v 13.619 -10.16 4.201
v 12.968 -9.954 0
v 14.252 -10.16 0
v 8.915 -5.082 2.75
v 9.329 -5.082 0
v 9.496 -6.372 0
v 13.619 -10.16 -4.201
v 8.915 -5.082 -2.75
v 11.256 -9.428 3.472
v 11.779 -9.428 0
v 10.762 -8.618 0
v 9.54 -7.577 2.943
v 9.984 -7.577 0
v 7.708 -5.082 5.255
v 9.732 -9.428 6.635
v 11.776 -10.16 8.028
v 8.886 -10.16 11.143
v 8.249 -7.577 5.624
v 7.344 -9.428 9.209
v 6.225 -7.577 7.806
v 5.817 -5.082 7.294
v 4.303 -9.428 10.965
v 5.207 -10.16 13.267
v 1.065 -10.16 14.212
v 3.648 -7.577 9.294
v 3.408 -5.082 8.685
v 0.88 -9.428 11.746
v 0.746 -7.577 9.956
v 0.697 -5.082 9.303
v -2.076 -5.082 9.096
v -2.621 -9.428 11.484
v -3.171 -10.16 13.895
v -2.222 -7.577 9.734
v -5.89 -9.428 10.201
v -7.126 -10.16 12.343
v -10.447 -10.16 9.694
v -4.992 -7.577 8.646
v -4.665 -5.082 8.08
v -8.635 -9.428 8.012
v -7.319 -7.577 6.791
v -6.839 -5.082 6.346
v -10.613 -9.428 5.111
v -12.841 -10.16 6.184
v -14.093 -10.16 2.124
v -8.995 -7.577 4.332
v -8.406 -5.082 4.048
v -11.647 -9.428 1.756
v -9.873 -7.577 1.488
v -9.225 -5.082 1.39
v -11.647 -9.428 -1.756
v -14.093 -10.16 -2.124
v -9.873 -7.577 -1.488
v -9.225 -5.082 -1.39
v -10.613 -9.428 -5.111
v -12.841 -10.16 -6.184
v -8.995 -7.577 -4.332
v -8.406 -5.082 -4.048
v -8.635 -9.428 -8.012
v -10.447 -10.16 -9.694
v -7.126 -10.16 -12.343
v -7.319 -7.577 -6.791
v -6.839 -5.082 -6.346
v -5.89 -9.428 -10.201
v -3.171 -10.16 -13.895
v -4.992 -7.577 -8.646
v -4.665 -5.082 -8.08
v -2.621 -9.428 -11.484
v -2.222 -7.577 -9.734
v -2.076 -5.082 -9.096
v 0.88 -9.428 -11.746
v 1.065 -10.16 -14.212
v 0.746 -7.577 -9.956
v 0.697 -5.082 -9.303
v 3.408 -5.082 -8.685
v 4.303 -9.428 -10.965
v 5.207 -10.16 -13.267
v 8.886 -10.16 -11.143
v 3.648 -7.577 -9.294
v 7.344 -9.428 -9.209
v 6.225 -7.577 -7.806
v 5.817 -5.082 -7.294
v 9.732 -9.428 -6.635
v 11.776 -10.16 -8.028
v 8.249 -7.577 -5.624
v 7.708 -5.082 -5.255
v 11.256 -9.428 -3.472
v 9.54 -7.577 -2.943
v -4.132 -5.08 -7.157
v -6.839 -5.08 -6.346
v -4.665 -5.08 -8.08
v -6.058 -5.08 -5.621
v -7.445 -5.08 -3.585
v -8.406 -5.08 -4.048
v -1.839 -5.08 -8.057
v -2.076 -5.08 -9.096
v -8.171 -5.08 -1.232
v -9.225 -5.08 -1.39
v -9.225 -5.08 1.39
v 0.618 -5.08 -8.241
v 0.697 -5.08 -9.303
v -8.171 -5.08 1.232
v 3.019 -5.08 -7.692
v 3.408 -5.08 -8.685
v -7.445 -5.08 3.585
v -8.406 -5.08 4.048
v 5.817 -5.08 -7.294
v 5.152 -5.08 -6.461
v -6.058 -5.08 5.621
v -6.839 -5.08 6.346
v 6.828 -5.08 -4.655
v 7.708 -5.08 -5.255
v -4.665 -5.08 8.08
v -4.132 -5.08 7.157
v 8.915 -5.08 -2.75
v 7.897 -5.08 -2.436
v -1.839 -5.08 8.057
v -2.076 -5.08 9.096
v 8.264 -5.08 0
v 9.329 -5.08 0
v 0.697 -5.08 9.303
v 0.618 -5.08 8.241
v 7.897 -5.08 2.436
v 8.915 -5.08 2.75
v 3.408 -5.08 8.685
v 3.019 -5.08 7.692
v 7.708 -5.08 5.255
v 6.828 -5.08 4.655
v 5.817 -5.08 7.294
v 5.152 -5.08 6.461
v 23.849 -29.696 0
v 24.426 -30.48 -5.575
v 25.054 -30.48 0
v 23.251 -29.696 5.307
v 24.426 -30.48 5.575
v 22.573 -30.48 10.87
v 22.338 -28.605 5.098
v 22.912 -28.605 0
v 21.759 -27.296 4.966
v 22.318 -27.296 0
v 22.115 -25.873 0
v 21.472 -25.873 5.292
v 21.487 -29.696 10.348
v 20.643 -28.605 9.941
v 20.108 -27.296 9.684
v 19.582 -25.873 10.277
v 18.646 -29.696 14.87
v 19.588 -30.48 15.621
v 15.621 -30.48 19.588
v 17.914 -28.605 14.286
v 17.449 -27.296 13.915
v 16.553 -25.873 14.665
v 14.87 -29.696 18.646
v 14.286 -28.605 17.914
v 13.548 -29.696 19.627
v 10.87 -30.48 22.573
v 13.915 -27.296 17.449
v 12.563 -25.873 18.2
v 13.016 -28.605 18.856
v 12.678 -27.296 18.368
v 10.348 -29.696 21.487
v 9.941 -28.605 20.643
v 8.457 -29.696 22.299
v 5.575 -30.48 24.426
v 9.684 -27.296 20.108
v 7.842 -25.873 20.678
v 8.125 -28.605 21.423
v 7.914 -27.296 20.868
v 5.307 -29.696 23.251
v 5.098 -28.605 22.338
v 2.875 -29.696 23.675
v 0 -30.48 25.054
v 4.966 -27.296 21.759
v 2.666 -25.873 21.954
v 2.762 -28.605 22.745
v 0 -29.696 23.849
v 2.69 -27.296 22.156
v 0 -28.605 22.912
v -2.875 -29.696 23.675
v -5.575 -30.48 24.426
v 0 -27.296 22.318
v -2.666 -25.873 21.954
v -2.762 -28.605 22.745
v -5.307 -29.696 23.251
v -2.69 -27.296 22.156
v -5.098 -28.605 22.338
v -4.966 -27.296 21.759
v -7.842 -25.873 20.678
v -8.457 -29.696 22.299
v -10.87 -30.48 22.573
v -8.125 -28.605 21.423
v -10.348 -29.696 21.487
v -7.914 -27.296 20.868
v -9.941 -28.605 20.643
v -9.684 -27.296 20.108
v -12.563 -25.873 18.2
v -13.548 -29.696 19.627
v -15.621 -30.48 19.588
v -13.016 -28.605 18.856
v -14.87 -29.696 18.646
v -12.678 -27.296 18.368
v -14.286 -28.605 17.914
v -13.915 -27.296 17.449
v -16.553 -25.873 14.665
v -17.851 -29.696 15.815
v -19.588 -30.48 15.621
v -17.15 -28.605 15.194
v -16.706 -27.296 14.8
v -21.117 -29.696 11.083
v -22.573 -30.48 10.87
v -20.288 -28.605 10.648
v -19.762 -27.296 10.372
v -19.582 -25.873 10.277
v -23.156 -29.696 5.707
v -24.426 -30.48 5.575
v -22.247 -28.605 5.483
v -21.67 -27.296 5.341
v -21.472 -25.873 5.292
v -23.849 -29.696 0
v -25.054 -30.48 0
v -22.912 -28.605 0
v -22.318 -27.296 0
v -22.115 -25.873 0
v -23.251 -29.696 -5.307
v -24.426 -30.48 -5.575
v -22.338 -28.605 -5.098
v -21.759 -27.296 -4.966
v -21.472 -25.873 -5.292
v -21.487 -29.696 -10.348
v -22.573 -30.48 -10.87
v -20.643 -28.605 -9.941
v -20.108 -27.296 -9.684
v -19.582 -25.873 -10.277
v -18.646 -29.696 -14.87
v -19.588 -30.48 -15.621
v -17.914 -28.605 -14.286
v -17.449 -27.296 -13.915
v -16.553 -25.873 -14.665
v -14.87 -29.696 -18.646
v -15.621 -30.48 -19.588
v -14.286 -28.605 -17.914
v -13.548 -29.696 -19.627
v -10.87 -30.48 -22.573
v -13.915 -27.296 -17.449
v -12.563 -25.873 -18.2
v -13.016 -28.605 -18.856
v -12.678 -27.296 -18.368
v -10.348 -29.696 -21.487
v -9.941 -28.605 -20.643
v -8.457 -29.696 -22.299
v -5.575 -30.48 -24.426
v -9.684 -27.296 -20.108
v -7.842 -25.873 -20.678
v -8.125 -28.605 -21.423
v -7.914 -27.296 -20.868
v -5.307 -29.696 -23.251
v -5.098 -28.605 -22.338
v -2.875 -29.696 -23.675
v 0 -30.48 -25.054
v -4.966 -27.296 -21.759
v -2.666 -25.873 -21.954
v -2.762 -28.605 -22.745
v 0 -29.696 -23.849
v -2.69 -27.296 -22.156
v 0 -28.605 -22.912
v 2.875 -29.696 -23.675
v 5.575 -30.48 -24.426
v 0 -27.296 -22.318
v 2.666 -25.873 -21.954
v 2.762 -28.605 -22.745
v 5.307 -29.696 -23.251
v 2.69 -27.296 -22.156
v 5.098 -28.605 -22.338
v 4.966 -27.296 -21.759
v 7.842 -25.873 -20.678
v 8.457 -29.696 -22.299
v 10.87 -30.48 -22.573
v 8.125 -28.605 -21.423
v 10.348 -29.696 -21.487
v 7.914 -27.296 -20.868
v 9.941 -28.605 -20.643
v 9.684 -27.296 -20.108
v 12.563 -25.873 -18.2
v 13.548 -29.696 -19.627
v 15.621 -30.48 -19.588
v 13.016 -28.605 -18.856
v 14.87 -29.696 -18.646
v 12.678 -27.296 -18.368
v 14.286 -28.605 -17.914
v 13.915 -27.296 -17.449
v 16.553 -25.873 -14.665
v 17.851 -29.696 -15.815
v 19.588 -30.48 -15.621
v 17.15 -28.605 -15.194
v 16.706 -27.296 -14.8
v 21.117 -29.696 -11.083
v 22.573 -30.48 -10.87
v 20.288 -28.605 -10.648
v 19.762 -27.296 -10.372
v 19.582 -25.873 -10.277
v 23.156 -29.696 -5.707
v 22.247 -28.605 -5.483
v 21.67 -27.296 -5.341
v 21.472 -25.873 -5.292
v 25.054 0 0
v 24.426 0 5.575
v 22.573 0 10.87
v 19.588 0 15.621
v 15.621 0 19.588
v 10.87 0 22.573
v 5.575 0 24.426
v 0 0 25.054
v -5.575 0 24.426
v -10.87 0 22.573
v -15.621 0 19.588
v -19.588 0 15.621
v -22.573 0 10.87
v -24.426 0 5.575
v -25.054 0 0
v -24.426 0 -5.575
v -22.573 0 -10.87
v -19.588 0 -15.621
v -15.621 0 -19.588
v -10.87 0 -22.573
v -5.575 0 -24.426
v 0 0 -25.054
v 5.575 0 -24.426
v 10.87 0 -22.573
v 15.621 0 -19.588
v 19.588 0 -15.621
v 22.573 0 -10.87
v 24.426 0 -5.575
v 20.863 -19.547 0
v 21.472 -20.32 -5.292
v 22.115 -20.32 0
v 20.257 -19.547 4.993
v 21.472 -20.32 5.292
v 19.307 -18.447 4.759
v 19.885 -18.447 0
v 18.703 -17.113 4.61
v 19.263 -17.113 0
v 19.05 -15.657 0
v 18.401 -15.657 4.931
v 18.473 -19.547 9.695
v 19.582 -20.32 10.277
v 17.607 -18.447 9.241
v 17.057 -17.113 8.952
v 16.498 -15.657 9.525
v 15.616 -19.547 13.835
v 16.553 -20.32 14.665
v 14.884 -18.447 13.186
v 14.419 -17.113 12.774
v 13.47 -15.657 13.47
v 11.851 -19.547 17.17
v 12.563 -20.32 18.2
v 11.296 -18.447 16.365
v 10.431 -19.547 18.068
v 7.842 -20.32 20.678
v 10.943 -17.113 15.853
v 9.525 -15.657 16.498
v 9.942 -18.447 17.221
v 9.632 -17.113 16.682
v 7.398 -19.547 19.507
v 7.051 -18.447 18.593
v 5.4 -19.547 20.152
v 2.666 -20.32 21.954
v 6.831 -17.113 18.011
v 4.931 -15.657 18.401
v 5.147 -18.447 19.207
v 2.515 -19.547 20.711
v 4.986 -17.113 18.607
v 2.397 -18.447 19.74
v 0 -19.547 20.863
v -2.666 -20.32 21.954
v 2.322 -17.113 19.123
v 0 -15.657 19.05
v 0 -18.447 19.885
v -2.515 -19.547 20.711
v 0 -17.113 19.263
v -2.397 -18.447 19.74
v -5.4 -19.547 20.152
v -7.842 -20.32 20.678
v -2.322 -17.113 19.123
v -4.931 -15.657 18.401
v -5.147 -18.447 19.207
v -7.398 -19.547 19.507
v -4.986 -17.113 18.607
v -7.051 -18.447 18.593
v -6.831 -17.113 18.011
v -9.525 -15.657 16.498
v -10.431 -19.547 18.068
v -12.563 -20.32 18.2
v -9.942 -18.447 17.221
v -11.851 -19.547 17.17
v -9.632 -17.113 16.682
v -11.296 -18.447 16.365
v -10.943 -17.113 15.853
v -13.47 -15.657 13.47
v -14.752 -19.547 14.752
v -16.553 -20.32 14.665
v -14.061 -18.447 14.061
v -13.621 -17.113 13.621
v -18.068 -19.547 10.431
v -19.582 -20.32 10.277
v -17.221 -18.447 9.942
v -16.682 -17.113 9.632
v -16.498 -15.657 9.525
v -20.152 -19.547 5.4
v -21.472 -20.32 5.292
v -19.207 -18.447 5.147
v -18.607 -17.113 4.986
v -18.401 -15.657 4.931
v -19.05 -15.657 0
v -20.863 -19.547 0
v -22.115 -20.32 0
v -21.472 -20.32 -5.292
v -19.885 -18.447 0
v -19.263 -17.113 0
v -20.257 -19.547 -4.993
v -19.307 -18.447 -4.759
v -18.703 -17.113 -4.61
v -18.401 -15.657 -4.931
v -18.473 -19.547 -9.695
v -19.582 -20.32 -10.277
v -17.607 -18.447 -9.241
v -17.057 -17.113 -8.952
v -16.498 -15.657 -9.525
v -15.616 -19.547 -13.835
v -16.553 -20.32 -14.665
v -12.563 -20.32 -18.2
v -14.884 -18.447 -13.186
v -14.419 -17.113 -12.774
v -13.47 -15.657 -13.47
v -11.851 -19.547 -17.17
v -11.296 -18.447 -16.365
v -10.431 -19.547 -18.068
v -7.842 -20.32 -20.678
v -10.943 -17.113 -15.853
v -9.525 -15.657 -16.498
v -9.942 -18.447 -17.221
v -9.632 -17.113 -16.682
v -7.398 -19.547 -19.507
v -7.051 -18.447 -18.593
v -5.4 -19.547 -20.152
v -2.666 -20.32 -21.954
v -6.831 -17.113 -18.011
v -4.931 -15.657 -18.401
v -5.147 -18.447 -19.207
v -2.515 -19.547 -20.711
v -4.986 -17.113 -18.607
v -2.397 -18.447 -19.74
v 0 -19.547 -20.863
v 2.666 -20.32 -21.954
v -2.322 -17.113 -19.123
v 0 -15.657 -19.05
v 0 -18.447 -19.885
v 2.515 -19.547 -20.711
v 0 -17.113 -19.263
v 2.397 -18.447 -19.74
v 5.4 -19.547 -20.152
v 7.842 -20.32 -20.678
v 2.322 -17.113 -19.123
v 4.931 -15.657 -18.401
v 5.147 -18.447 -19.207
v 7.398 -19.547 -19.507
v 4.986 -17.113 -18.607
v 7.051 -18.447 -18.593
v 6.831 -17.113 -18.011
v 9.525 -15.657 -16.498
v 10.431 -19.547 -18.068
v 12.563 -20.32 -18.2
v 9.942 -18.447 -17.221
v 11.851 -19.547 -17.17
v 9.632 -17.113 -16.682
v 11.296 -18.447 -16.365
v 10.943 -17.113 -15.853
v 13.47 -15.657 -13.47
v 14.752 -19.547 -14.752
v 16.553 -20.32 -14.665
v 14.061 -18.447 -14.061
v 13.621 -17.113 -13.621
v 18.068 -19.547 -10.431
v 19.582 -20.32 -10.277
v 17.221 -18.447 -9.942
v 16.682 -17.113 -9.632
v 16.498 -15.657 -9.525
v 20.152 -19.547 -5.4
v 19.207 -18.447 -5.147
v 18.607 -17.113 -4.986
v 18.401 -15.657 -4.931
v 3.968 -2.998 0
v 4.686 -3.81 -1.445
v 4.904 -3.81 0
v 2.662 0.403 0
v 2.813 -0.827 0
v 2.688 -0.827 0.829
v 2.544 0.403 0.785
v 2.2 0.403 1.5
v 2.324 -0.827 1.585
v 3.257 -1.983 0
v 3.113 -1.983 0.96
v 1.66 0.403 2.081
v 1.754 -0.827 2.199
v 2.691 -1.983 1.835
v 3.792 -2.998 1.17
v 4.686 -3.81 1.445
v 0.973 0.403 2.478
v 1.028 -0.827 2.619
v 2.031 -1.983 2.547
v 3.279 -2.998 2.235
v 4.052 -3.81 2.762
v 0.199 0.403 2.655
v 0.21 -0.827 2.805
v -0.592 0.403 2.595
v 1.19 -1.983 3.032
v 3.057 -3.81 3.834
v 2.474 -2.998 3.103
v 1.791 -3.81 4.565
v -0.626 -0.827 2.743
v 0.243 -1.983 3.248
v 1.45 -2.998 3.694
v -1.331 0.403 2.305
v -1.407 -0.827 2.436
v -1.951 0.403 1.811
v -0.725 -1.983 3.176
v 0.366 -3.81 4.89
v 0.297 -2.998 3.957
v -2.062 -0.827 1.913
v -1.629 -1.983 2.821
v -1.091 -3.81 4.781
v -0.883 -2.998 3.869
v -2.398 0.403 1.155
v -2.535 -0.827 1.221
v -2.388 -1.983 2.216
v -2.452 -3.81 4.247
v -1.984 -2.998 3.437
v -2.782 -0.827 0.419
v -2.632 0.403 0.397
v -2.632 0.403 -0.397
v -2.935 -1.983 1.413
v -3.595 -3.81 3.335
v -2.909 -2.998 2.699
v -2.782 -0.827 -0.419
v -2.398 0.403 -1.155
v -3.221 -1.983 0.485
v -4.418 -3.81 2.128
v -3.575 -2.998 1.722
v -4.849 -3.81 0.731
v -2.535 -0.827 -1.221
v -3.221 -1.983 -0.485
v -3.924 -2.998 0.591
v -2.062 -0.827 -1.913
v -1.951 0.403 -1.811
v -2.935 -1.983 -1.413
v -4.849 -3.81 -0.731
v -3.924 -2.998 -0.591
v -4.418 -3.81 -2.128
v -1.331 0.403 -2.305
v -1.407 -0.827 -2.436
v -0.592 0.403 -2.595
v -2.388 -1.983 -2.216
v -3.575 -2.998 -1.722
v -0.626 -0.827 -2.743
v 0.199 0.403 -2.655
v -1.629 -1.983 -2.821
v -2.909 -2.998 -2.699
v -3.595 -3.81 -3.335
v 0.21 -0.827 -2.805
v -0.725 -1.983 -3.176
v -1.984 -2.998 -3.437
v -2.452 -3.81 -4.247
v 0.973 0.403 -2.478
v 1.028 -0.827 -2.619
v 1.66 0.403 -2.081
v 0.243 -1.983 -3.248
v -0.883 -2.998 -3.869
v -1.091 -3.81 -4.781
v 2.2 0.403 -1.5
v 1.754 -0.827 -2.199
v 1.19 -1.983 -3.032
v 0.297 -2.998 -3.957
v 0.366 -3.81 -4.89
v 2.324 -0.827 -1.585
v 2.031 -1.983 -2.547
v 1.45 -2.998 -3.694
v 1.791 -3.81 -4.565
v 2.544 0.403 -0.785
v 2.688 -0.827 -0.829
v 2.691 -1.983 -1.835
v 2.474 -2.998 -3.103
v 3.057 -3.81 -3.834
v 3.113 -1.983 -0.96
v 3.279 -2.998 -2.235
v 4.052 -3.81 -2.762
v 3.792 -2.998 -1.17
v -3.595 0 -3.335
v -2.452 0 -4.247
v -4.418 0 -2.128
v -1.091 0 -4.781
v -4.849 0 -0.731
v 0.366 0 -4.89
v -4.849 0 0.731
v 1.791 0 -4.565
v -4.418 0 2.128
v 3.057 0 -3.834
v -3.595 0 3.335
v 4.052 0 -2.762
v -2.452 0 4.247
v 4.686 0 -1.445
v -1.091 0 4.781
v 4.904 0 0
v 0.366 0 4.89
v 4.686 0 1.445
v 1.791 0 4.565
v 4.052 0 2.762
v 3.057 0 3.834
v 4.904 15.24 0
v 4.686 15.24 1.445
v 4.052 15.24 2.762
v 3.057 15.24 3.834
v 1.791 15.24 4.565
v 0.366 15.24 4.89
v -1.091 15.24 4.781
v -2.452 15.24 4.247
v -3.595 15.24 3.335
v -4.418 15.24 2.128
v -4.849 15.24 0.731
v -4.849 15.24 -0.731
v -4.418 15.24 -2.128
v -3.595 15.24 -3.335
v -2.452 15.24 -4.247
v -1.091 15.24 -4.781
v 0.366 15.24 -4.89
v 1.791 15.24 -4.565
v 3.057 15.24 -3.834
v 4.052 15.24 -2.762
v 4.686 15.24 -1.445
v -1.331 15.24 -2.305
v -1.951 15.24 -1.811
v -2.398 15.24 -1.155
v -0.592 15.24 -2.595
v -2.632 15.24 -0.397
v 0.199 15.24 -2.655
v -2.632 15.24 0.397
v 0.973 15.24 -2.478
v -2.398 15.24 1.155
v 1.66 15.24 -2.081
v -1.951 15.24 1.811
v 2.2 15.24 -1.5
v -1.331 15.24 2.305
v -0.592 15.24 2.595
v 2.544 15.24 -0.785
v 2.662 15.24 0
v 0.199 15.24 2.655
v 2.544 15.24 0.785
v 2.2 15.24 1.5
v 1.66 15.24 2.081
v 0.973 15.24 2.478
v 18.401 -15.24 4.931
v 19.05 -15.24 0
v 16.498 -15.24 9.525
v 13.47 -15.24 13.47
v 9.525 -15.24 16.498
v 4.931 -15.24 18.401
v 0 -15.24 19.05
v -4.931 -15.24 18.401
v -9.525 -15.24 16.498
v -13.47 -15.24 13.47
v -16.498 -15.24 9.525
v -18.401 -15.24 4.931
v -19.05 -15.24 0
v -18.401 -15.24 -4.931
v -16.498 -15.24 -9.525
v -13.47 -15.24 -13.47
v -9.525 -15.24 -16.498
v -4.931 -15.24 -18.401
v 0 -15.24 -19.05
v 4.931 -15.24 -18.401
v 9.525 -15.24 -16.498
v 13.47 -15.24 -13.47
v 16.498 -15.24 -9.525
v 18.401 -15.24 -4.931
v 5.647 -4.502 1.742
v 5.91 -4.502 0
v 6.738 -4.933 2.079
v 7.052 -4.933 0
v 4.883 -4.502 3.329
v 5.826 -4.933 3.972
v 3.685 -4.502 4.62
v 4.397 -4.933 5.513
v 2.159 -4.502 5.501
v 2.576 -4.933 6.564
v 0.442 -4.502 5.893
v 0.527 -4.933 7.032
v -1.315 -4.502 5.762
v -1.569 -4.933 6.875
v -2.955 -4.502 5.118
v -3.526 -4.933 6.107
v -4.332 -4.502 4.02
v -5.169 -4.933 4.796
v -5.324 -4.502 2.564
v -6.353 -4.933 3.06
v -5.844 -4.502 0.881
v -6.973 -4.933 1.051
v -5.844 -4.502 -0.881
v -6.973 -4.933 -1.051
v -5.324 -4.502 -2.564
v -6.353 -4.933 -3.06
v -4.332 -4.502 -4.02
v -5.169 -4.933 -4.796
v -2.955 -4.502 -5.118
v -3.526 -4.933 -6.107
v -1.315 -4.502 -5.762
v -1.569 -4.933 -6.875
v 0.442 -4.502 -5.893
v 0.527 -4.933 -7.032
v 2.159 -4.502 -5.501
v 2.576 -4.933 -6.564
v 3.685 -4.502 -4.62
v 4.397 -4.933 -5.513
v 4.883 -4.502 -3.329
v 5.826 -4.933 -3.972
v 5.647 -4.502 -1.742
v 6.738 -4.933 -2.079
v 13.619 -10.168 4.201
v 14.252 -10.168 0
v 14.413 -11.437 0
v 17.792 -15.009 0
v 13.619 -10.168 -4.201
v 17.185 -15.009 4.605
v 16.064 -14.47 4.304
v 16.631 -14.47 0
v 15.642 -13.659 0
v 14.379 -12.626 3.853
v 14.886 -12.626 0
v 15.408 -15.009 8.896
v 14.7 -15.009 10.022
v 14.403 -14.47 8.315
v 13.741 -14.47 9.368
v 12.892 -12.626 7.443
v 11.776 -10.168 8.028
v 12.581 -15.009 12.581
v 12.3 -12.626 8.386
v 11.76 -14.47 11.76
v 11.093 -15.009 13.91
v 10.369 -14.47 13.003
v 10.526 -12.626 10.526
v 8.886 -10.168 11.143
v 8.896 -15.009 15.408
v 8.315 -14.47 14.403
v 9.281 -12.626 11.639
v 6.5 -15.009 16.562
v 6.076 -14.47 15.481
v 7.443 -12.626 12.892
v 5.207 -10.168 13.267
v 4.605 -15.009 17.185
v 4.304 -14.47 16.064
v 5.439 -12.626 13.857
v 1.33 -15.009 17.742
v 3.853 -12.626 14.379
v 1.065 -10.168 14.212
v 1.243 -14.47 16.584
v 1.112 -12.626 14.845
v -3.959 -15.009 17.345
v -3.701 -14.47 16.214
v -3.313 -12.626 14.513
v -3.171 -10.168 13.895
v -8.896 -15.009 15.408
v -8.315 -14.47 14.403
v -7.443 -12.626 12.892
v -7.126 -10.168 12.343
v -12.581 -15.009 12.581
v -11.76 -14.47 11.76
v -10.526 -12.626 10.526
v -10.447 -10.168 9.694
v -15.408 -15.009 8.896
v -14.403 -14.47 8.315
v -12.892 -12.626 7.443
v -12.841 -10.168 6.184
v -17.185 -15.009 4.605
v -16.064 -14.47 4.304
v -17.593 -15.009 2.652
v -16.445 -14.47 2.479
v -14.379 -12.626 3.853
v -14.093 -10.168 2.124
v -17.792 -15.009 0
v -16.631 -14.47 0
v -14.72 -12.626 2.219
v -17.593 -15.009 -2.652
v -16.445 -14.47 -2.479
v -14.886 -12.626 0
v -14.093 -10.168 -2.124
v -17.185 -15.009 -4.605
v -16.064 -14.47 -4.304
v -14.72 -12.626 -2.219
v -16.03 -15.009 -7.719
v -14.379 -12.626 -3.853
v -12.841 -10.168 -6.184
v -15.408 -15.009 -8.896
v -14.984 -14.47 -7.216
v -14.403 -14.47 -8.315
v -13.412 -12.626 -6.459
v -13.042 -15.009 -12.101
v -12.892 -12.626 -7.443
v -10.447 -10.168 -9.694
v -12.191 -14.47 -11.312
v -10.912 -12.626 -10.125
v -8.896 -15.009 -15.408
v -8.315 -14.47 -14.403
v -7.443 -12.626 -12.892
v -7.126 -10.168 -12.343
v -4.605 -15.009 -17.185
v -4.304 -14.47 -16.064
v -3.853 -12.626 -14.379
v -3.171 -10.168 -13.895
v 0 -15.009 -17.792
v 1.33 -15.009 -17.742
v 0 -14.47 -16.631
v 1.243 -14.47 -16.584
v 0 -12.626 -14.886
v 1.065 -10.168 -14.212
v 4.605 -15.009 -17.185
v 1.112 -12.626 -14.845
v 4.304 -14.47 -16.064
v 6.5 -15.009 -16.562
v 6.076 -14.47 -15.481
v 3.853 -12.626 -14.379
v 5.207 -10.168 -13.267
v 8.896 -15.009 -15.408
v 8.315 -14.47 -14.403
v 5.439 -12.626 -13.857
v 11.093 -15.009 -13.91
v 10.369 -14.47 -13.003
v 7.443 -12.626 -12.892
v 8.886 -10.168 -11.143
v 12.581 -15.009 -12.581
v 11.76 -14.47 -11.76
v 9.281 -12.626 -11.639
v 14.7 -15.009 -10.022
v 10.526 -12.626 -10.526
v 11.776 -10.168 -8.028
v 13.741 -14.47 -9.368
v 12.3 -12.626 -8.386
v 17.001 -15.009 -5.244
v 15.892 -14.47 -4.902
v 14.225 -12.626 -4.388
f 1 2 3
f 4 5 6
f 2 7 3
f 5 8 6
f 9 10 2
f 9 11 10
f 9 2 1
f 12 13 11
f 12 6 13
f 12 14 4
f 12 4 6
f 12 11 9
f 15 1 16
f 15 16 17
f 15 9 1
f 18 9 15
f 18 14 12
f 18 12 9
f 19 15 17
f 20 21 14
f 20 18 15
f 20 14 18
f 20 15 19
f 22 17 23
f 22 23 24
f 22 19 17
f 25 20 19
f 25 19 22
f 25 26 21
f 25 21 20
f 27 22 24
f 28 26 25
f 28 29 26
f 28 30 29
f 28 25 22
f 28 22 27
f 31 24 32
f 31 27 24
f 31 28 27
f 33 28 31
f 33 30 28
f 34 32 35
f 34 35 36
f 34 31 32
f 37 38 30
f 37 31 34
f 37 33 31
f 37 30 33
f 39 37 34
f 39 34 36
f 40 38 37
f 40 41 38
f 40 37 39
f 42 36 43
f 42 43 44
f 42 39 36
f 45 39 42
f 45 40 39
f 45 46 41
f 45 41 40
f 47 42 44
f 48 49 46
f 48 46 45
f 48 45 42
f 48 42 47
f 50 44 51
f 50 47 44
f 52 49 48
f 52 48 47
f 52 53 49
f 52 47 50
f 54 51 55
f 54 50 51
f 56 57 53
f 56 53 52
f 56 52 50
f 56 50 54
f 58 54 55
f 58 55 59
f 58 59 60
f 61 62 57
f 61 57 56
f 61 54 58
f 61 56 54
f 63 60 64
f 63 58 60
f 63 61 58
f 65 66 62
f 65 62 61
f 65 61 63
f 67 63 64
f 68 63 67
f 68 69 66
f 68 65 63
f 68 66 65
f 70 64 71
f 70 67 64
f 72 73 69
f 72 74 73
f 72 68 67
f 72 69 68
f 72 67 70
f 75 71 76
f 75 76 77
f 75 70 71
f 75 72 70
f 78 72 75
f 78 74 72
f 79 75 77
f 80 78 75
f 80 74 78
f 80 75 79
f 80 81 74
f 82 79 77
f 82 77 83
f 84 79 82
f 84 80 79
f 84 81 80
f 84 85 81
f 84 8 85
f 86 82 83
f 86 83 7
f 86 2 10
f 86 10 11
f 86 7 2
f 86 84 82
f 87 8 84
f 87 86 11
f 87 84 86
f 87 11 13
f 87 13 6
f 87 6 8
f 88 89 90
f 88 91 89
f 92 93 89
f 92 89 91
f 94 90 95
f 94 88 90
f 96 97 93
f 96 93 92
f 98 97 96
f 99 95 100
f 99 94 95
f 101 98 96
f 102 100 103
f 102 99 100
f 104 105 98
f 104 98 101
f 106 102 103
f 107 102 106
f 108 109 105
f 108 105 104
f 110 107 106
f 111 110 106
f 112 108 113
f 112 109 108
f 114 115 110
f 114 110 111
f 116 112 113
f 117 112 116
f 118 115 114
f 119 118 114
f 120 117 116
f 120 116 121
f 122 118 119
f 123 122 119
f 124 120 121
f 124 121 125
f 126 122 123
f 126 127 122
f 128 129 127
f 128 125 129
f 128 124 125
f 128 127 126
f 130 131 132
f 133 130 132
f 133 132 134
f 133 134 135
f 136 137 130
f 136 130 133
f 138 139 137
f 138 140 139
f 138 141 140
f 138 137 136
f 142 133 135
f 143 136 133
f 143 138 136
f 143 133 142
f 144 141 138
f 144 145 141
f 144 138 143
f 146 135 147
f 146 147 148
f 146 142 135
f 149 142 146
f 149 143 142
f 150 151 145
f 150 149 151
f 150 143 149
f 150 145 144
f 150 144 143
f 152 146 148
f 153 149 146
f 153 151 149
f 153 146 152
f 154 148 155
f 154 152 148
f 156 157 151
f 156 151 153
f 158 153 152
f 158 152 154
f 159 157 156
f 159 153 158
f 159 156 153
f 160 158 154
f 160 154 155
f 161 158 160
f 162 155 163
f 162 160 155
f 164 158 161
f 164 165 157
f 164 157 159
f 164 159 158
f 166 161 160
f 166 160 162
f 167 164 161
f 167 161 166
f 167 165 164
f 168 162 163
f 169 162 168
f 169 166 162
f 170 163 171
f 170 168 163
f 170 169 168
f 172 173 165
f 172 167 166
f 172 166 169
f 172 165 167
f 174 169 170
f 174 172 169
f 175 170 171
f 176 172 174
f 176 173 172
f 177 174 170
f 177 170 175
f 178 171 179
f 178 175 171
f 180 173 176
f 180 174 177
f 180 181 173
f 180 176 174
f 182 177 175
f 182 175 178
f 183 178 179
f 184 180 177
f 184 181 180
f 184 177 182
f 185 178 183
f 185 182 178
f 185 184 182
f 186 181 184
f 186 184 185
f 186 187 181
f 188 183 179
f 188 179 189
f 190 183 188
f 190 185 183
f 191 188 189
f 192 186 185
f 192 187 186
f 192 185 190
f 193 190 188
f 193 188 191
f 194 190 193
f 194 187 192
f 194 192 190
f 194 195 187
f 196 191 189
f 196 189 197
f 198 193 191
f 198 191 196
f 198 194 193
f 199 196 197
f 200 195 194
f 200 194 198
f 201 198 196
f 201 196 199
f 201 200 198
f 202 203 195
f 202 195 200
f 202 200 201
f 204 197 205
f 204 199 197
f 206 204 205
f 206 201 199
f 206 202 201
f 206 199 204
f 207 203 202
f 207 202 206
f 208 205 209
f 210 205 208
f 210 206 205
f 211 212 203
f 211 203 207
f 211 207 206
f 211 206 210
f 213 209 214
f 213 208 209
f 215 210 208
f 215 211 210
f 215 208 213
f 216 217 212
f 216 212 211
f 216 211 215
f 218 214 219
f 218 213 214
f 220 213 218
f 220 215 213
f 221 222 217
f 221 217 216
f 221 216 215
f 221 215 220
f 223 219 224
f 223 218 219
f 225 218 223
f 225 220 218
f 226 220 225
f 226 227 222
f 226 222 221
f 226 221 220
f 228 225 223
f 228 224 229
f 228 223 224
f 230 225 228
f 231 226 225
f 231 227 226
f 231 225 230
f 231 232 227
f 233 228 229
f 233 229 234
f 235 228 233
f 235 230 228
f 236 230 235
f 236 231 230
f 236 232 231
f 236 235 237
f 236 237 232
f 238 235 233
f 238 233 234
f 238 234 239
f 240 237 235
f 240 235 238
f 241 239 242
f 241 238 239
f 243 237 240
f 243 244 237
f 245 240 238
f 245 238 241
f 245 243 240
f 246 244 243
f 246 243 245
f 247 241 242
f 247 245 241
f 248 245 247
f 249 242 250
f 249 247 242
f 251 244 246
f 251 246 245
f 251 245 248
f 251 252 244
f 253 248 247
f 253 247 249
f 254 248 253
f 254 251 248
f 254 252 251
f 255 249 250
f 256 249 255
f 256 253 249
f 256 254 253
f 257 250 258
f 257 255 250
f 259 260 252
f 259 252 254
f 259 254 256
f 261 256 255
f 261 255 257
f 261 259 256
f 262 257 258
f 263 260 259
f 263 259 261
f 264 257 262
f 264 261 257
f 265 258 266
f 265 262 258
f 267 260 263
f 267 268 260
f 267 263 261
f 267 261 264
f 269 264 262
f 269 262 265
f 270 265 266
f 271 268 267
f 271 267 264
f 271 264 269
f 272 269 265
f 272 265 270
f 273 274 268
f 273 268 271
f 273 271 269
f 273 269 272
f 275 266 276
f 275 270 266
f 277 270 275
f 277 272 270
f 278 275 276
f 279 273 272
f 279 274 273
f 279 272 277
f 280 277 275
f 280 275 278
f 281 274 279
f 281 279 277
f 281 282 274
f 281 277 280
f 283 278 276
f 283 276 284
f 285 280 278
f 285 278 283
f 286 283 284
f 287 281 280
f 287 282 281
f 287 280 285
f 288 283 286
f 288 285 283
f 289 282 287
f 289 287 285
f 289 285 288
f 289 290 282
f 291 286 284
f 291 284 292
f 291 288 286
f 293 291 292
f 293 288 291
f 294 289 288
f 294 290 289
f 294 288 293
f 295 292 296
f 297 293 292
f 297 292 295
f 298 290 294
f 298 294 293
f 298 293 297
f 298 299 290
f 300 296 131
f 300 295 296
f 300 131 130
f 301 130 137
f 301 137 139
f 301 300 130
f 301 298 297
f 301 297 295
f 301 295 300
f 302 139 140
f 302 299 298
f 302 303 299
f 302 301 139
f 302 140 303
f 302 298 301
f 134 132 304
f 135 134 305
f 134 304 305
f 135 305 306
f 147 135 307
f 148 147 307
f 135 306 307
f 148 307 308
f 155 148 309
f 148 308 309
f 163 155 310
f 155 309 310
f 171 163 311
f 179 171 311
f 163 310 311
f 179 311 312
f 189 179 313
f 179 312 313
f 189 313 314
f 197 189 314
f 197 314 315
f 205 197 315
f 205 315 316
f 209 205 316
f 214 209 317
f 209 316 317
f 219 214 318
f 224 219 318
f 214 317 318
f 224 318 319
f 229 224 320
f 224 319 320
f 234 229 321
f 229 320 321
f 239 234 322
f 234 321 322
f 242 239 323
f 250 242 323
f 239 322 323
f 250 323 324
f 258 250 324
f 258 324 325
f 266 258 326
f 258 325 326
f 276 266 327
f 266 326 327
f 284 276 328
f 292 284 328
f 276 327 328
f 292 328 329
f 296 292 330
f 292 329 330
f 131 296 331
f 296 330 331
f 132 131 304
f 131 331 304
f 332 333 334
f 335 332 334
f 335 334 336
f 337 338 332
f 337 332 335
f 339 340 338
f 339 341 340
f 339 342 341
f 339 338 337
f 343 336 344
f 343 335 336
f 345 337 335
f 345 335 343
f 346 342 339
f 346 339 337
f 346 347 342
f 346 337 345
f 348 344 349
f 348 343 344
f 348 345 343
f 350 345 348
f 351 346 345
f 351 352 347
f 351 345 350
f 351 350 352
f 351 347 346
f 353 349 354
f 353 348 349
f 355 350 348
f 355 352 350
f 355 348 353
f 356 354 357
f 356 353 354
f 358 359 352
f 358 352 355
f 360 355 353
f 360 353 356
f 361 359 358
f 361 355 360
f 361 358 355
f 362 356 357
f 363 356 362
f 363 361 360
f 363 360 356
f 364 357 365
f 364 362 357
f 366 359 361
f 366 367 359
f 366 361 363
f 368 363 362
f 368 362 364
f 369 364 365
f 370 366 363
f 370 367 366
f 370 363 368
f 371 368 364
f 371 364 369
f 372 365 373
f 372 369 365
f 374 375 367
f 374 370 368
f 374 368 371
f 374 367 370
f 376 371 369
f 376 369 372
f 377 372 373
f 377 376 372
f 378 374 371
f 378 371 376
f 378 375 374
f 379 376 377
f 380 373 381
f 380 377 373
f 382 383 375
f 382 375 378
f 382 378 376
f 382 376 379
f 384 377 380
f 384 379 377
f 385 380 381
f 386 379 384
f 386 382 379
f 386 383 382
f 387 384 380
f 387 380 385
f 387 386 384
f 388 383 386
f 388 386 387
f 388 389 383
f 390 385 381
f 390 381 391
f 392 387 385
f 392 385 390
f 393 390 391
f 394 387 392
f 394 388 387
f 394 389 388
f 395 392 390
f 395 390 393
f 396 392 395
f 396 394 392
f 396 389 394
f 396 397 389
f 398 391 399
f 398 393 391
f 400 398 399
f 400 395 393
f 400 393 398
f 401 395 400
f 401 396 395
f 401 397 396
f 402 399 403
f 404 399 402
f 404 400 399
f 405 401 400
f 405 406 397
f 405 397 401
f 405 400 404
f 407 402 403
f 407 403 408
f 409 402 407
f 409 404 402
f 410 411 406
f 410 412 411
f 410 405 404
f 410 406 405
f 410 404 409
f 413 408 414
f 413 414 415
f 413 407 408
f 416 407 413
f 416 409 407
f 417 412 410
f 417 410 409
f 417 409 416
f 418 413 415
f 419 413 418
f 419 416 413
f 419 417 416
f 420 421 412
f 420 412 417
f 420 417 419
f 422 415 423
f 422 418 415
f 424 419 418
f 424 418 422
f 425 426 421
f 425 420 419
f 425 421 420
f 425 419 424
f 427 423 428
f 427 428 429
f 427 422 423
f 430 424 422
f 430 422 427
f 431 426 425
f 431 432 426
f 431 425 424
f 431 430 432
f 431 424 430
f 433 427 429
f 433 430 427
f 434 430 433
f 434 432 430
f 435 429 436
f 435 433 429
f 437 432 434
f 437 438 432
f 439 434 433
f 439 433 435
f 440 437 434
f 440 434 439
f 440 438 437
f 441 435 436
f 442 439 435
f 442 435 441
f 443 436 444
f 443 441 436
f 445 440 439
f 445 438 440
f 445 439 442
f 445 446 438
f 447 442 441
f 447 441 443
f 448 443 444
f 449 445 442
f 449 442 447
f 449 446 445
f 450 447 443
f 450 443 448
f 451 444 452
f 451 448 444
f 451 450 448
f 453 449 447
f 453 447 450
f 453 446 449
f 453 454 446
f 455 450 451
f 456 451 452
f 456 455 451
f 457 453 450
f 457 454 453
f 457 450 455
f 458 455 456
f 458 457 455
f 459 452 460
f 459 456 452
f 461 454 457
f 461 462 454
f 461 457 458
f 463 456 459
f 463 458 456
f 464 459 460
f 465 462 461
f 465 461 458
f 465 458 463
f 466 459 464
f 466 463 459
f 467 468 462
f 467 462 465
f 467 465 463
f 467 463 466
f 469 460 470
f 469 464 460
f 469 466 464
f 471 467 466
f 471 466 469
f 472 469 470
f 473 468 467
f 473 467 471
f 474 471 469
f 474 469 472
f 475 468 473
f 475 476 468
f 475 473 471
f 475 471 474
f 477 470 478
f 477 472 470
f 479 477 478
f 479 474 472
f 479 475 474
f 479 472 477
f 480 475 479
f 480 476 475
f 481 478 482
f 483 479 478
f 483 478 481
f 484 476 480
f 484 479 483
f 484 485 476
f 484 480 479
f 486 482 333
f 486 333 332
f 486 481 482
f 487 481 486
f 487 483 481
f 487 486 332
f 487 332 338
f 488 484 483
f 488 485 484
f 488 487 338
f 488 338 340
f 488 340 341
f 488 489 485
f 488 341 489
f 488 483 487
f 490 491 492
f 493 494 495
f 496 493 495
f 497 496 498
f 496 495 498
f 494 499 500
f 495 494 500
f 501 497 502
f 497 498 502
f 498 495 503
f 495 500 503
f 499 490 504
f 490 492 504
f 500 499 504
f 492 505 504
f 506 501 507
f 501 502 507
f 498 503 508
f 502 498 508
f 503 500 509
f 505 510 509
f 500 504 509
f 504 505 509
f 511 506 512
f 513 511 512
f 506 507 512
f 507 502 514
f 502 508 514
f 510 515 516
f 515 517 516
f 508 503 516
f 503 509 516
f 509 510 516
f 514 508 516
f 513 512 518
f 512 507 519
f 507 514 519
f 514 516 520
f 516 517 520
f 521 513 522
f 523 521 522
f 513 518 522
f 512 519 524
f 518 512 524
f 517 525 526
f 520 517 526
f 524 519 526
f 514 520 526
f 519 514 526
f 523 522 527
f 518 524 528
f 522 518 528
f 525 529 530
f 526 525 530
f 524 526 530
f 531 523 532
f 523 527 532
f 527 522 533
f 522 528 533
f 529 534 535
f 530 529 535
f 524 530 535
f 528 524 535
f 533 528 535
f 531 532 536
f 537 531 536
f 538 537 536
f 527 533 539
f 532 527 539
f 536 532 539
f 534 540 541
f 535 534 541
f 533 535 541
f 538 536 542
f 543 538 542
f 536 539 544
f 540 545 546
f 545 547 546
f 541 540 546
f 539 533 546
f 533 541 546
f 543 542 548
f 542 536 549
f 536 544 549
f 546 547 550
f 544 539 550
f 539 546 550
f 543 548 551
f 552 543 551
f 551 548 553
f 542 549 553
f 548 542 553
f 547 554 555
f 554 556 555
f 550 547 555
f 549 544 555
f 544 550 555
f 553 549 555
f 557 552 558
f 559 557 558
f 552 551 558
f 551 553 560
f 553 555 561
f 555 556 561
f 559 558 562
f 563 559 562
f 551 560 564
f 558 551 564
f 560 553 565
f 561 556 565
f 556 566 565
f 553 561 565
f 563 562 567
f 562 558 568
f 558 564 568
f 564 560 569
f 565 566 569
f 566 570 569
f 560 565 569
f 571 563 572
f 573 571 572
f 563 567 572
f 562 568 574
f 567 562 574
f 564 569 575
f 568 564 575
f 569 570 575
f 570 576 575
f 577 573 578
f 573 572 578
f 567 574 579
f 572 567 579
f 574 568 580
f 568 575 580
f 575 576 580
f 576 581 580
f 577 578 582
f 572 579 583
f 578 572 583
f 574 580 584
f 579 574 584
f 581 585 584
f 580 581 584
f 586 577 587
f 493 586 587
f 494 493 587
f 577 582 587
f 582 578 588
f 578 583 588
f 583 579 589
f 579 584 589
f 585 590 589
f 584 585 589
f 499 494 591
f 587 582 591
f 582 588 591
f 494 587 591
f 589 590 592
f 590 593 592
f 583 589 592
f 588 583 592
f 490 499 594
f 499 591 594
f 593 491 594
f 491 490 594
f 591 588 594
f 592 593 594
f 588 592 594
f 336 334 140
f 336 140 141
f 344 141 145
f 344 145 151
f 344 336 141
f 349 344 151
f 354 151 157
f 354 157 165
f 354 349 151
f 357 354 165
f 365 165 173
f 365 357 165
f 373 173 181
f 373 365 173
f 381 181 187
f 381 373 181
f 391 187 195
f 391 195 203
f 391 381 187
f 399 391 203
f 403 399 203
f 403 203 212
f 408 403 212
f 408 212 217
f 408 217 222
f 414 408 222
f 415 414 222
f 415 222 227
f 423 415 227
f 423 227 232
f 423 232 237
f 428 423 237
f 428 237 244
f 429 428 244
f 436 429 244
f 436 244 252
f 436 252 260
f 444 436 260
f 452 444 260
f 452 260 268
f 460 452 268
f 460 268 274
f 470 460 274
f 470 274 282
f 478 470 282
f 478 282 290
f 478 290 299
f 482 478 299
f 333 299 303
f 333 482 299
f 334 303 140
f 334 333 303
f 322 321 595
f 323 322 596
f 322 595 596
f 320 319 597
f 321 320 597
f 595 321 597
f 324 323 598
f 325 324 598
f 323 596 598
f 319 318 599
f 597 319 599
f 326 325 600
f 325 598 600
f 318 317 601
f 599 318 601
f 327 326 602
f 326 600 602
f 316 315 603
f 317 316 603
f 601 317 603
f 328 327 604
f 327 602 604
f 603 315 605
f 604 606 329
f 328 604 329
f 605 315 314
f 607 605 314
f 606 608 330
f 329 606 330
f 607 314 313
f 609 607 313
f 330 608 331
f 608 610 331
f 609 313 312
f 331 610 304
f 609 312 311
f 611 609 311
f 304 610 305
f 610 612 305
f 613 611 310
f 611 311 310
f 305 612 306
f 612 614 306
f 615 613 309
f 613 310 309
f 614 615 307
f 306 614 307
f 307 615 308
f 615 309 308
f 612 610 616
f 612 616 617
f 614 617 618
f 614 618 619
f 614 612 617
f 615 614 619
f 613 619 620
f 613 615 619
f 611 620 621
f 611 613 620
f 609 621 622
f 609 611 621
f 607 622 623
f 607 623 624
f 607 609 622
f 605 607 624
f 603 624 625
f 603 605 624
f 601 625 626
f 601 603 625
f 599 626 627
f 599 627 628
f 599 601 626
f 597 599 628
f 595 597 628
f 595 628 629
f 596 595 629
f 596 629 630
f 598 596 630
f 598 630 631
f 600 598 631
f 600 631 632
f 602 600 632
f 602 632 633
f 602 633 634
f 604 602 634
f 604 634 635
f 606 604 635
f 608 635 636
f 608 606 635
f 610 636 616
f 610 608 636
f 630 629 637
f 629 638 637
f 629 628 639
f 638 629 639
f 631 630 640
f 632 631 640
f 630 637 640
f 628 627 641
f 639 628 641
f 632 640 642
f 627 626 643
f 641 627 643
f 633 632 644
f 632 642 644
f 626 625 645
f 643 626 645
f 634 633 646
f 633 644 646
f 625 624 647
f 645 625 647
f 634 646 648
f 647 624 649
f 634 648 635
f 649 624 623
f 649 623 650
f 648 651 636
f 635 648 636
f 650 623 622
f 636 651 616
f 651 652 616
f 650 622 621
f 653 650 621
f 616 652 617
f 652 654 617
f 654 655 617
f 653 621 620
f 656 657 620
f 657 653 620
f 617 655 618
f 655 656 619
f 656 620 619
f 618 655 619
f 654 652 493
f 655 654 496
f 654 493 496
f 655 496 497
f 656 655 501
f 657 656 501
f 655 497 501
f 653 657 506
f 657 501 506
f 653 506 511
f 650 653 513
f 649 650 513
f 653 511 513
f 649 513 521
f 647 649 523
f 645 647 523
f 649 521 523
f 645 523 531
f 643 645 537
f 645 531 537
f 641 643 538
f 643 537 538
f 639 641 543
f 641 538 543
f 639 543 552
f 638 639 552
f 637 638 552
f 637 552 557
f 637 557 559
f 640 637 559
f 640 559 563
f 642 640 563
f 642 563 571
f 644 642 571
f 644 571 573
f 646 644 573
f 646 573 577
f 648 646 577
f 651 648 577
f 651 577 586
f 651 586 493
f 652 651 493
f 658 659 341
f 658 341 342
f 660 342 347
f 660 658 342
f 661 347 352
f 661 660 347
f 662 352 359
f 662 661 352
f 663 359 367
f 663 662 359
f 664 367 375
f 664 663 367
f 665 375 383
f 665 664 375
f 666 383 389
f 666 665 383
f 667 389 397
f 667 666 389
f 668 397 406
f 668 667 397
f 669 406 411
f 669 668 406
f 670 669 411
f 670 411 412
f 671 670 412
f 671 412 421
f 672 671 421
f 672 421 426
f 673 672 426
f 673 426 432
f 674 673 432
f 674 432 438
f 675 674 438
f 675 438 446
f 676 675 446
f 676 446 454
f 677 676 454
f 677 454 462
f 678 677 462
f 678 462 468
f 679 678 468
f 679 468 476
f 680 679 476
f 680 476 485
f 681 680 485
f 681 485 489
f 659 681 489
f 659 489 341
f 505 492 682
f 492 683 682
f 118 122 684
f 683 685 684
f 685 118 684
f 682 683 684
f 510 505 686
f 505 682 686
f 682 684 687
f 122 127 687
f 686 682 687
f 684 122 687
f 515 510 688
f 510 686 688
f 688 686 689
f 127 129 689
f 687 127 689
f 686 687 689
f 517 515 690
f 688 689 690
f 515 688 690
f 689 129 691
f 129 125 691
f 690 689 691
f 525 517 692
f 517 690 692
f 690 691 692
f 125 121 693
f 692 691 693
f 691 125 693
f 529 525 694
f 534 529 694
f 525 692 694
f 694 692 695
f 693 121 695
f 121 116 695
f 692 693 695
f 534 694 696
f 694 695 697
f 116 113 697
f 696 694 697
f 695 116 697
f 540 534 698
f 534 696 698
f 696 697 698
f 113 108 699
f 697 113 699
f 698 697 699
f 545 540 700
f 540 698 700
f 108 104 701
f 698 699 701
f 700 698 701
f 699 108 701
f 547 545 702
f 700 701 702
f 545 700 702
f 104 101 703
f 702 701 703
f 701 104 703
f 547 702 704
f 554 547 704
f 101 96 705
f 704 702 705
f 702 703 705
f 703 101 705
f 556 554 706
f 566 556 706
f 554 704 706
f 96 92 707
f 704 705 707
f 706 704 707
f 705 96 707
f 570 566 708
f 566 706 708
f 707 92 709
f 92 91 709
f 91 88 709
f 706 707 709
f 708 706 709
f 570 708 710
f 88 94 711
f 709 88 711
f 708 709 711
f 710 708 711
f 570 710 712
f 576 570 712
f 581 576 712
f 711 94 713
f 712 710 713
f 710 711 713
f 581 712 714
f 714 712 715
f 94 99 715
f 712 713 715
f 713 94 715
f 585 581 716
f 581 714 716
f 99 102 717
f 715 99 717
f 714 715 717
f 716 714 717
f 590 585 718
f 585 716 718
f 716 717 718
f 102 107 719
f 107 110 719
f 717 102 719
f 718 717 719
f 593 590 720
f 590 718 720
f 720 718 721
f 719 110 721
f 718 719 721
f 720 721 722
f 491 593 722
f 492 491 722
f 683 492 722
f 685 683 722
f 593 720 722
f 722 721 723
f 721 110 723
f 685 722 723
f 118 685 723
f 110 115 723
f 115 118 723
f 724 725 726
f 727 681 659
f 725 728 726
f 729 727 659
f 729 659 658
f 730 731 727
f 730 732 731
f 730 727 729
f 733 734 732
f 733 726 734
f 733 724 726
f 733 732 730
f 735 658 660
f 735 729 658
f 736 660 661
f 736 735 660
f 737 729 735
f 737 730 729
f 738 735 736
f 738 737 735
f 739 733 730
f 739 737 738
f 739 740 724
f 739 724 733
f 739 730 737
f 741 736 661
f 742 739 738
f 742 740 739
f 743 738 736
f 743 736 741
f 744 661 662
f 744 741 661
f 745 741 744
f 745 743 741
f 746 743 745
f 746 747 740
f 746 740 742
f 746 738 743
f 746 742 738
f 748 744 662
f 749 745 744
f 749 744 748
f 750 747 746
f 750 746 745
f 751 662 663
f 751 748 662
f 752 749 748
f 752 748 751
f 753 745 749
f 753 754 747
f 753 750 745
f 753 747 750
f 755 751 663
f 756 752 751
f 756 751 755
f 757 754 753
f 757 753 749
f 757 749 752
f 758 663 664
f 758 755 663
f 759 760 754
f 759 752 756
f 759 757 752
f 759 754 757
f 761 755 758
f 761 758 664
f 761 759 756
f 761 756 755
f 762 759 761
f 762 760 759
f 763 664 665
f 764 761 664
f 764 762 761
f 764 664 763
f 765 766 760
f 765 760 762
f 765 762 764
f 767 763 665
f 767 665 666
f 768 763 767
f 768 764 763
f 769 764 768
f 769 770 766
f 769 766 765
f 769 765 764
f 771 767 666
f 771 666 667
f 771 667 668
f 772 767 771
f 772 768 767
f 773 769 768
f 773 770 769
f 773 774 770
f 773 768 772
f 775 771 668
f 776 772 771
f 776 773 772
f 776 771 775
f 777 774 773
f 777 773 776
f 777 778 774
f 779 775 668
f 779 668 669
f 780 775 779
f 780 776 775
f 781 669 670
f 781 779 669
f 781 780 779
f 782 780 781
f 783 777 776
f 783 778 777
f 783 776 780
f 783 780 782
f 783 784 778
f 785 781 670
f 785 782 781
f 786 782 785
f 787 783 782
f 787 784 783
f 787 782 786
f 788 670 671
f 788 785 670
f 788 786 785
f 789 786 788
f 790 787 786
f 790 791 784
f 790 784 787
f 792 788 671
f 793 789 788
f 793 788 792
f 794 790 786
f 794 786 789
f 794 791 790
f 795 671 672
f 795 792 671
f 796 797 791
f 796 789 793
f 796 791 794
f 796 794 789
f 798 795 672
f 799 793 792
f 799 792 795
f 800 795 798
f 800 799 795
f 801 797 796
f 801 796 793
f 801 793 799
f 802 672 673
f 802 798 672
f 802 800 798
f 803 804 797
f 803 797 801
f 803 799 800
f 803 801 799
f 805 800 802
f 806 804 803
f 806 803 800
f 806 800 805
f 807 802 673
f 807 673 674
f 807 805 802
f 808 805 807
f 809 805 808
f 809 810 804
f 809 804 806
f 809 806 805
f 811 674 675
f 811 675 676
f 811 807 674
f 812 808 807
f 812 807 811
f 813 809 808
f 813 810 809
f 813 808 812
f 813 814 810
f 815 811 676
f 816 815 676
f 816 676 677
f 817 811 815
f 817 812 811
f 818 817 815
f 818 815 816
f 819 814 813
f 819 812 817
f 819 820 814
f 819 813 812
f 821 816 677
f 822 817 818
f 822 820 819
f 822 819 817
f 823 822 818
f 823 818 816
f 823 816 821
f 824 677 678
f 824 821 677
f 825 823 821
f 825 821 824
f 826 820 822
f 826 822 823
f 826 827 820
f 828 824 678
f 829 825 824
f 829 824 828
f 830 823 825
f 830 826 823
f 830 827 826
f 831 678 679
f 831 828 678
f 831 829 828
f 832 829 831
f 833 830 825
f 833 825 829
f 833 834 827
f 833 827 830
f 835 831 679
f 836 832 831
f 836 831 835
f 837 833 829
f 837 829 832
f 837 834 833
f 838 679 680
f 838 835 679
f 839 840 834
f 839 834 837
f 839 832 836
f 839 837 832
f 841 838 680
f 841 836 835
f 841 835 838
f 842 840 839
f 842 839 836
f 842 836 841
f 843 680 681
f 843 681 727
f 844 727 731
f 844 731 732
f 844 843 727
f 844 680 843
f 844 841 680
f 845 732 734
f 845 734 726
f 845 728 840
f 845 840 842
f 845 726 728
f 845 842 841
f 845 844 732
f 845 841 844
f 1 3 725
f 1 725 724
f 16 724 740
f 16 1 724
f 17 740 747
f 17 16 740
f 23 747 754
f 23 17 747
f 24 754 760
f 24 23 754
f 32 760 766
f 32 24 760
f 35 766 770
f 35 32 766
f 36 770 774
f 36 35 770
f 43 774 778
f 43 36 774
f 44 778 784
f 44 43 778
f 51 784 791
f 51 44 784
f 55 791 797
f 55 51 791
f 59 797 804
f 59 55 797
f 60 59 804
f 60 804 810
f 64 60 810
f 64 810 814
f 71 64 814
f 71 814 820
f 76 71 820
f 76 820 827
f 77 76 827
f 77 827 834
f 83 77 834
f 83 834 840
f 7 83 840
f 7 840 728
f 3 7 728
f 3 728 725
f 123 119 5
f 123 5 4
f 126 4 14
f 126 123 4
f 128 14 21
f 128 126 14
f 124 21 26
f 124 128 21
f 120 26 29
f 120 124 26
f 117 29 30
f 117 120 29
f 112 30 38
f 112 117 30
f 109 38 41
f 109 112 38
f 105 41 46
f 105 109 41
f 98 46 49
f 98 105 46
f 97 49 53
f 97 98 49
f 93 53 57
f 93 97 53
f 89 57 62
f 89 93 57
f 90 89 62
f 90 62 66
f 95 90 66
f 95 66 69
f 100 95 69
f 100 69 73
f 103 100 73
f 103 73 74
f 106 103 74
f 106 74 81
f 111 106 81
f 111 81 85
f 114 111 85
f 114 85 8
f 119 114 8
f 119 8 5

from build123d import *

# Parameters (mm, degrees)
F0_R     = 25.0538592269
F0_R_2   = 22.1151021615
F1_DEPTH = 30.48
F0_R_3   = 19.05
F2_DEPTH = 20.32
F0_R_4   = 14.2519488642
F3_DEPTH = 15.24
F0_R_5   = 9.329458502
F4_DEPTH = 10.16
F0_R_6   = 4.9036289707
F5_DEPTH = 5.08
F0_R_7   = 2.6620736833
F6_DEPTH = 3.81
F7_DEPTH = 15.24


# Not quite as in the source:
# - a fillet or chamfer that OpenCascade refuses, or shapes differently, is made with other operations: its cross-section is extruded or revolved along the edge and cut away or added


with BuildPart() as f1:
    # F0 (on Front) → F1 (new body)
    with BuildSketch(Plane.XZ):
        Circle(F0_R)
        Circle(F0_R_2, mode=Mode.SUBTRACT)
    extrude(amount=F1_DEPTH)

    # F0 (on Front) → F2 (join)
    with BuildSketch(Plane.XZ):
        Circle(F0_R_2)
        Circle(F0_R_3, mode=Mode.SUBTRACT)
    extrude(amount=F2_DEPTH)

    # F0 (on Front) → F3 (join)
    with BuildSketch(Plane.XZ):
        Circle(F0_R_3)
        Circle(F0_R_4, mode=Mode.SUBTRACT)
    extrude(amount=F3_DEPTH)

    # F0 (on Front) → F4 (join)
    with BuildSketch(Plane.XZ):
        Circle(F0_R_4)
        Circle(F0_R_5, mode=Mode.SUBTRACT)
    extrude(amount=F4_DEPTH)

    # F0 (on Front) → F5 (join)
    with BuildSketch(Plane.XZ):
        Circle(F0_R_5)
        Circle(F0_R_6, mode=Mode.SUBTRACT)
    extrude(amount=F5_DEPTH)

    # F0 (on Front) → F6 (join)
    with BuildSketch(Plane.XZ):
        Circle(F0_R_6)
        Circle(F0_R_7, mode=Mode.SUBTRACT)
    extrude(amount=F6_DEPTH)

    # F0 (on Front) → F7 (join)
    with BuildSketch(Plane.XZ):
        Circle(F0_R_6)
        Circle(F0_R_7, mode=Mode.SUBTRACT)
    extrude(amount=-F7_DEPTH)

    # F8: fillet of radius 5.08 on 6 edges, made by hand

    # F8_s1 → F8_t2 (revolve, cut)
    with BuildSketch(Plane.XY):
        with BuildLine():
            ThreePointArc((25.0538592269, -30.48), (22.9123510534, -28.6054356547), (22.1151021615, -25.87332238))
            Line((22.1151021615, -25.87332238), (22.1151021615, -30.48))
            Line((22.1151021615, -30.48), (25.0538592269, -30.48))
        make_face()
    revolve(axis=Axis((0, -30.48, 0), (0, -1, 0)), mode=Mode.SUBTRACT)

    # F8_s3 → F8_t4 (revolve, cut)
    with BuildSketch(Plane.XY):
        with BuildLine():
            ThreePointArc((22.1151021615, -20.32), (19.8848803892, -18.4469021379), (19.05, -15.6566764319))
            Line((19.05, -15.6566764319), (19.05, -20.32))
            Line((19.05, -20.32), (22.1151021615, -20.32))
        make_face()
    revolve(axis=Axis((0, -20.32, 0), (0, -1, 0)), mode=Mode.SUBTRACT)

    # F8_s5 → F8_t6 (revolve, cut)
    with BuildSketch(Plane.XY):
        with BuildLine():
            ThreePointArc((19.05, -15.24), (15.6415084955, -13.6588259054), (14.2519488642, -10.1678303619))
            Line((14.2519488642, -10.1678303619), (14.2519488642, -15.24))
            Line((14.2519488642, -15.24), (19.05, -15.24))
        make_face()
    revolve(axis=Axis((0, -15.24, 0), (0, -1, 0)), mode=Mode.SUBTRACT)

    # F8_s7 → F8_t8 (revolve, cut)
    with BuildSketch(Plane.XY):
        with BuildLine():
            ThreePointArc((14.2519488642, -10.16), (10.7620930857, -8.6184183396), (9.329458502, -5.082442446))
            Line((9.329458502, -5.082442446), (9.329458502, -10.16))
            Line((9.329458502, -10.16), (14.2519488642, -10.16))
        make_face()
    revolve(axis=Axis((0, -10.16, 0), (0, -1, 0)), mode=Mode.SUBTRACT)

    # F8_s9 → F8_t10 (revolve, cut)
    with BuildSketch(Plane.XY):
        with BuildLine():
            ThreePointArc((4.9036289707, -3.81), (6.4676819116, -4.7519048812), (8.2637331358, -5.08))
            Line((8.2637331358, -5.08), (4.9036289707, -5.08))
            Line((4.9036289707, -5.08), (4.9036289707, -3.81))
        make_face()
    revolve(axis=Axis((0, -5.08, 0), (0, -1, 0)), mode=Mode.SUBTRACT)

    # F8_s11 → F8_t12 (revolve, cut)
    with BuildSketch(Plane.XY):
        with BuildLine():
            ThreePointArc((2.6620736833, 0.4030311669), (3.2573385105, -1.9830850142), (4.9036289707, -3.81))
            Line((4.9036289707, -3.81), (2.6620736833, -3.81))
            Line((2.6620736833, -3.81), (2.6620736833, 0.4030311669))
        make_face()
    revolve(axis=Axis((0, -3.81, 0), (0, -1, 0)), mode=Mode.SUBTRACT)


solid = f1.part
